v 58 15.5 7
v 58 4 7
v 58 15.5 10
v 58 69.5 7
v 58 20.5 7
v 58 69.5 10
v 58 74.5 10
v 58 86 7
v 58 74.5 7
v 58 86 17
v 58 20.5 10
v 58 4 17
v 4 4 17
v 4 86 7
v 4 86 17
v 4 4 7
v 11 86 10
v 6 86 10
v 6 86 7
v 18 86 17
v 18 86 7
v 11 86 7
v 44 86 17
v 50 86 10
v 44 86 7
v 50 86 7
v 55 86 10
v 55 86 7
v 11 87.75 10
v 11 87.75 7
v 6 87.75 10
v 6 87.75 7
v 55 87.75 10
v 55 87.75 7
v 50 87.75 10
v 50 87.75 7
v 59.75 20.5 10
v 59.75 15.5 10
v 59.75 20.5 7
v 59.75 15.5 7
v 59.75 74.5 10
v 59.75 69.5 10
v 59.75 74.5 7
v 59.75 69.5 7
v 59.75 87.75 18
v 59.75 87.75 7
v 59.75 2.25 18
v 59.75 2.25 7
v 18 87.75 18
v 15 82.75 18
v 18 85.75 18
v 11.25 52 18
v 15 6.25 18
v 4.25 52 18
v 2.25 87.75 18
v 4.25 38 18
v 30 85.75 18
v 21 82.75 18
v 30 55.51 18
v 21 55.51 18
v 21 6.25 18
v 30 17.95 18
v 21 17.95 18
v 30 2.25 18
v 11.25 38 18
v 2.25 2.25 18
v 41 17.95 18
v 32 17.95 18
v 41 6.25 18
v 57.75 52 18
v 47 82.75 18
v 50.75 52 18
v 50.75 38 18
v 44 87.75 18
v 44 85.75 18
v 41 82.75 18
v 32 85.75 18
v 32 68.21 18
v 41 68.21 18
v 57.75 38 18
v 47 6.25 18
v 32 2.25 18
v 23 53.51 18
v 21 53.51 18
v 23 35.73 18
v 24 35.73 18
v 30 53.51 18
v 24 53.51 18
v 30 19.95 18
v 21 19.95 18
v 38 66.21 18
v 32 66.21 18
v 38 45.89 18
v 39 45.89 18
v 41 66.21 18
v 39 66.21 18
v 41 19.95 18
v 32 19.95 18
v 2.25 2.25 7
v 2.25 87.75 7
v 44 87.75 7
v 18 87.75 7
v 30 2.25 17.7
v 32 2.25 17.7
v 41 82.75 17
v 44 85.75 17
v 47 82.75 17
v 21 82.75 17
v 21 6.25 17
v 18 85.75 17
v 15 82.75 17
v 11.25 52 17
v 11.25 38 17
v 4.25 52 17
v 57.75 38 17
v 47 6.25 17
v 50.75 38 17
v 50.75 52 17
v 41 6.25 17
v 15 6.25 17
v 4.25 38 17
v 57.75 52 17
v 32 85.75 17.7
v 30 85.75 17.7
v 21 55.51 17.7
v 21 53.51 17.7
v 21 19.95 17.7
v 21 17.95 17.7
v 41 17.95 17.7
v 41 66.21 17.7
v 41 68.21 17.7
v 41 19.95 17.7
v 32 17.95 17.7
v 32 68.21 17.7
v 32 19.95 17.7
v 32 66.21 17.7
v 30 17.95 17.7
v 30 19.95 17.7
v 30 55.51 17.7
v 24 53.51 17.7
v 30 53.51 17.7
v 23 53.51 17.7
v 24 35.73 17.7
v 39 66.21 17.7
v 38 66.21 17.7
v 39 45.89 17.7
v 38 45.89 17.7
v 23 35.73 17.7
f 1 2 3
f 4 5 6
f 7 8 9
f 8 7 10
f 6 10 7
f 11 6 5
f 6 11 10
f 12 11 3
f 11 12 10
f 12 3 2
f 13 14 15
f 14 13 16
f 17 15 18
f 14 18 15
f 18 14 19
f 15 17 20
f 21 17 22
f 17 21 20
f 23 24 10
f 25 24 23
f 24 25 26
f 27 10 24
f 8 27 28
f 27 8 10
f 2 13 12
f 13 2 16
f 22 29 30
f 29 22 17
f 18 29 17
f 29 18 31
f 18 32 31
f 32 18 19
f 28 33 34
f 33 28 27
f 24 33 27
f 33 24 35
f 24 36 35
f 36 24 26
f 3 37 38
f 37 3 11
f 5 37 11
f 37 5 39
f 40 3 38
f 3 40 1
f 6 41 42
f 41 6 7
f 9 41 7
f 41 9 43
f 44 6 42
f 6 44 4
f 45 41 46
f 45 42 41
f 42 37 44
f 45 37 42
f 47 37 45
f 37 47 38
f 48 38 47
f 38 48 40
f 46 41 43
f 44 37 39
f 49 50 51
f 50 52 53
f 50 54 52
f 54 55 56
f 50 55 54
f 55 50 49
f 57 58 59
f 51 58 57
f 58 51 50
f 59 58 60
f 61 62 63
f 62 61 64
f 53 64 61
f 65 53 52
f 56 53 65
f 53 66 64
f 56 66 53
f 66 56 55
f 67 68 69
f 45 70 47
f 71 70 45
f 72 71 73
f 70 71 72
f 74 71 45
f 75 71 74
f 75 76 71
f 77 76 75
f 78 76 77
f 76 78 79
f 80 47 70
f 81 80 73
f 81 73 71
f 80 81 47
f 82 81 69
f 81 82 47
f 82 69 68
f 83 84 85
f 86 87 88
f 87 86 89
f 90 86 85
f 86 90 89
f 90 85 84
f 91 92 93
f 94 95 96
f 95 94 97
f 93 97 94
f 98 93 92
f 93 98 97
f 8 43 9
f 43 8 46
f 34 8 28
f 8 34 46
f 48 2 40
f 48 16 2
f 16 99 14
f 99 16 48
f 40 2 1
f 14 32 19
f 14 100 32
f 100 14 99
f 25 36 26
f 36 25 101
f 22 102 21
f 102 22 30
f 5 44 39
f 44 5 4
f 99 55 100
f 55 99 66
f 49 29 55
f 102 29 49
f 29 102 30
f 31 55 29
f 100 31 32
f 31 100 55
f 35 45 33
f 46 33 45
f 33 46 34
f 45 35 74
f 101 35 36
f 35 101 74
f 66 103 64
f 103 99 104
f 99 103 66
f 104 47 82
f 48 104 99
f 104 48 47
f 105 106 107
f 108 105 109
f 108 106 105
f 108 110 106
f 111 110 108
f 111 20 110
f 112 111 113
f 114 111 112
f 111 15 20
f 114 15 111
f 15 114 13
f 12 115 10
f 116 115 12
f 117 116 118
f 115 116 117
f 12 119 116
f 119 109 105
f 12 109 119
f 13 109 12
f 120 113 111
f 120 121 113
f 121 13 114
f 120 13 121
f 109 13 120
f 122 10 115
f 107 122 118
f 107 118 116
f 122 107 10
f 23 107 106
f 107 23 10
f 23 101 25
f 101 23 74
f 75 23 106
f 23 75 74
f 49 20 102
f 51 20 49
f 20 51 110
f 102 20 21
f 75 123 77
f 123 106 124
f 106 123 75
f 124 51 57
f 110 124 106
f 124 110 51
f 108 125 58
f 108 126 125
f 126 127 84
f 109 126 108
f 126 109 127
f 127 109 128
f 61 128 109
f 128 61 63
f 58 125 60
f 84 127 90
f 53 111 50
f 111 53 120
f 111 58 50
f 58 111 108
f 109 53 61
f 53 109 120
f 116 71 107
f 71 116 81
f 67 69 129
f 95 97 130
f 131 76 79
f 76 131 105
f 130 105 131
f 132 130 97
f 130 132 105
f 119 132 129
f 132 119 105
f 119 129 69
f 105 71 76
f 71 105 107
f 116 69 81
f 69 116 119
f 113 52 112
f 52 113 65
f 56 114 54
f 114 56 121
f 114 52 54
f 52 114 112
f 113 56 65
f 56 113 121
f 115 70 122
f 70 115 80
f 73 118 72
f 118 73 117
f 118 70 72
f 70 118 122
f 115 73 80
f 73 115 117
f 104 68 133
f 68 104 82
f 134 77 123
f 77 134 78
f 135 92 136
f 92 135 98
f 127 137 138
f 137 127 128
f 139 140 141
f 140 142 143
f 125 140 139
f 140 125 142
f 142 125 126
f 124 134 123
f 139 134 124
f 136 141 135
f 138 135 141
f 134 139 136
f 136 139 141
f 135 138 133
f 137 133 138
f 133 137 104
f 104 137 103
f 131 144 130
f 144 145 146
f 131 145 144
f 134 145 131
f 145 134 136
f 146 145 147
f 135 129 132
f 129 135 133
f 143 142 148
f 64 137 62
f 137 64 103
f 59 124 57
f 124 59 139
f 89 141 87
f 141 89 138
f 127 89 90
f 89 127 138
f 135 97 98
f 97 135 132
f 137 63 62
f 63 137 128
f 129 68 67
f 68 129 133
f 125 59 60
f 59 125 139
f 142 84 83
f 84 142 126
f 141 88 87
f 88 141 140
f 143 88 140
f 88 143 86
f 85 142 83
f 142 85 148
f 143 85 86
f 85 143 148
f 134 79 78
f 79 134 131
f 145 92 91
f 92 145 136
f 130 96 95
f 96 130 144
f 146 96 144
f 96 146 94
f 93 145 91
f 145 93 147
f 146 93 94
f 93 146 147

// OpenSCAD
width = 54;
height = 82;
depth = 10;

holderDepth = 6;

leftSideWidth = 9;
rightSideWidth = 9;

bottomOffset = 1;
bottomCaseDepth = depth + bottomOffset + 2;
bottomCaseWidth = width + 8;
bottomCaseHeight = height + 8;

topCaseWidth = width + 4 - 0.5;
topCaseHeight = height + 4 - 0.5;

STM32Width = 25 + 1;
STM32Height = 60;

module breadboard() {
    translate([0,0,0]) /* body */
        cube([width,height,depth]);
    translate([leftSideWidth/2 - 5/2,height,0]) /* left-top */
        cube([5,2,holderDepth]);
    translate([width/2 - 5/2,height,0]) /* center-top */
        cube([5,2,holderDepth]);
    translate([width - rightSideWidth/2 - 5/2 - 1,height,0]) /* right-top */
        cube([5,2,holderDepth]);
    translate([width,11.5,0]) /* right-up */
        cube([2,5,holderDepth]);
    translate([width,height - 11.5 - 5,0]) /* right-down */
        cube([2,5,holderDepth]);
}

module botttomCase() {
    echo("bottom case", bottomCaseWidth, bottomCaseHeight);

    difference() {
        translate([0,0,0])
            cube([bottomCaseWidth, bottomCaseHeight, bottomCaseDepth]);
        translate([4,4,bottomOffset])
            breadboard();
        translate([2,2,holderDepth])
            cube([width + 4, height + 4, bottomCaseDepth - holderDepth]);

// debug
        translate([bottomCaseWidth/2 - 5, 0, 0])
            cube([10,6,bottomCaseDepth]);
    }
}

module topCase() {
    caseOffset = 1;

    borderDepth = 10;
    topDepth = borderDepth + caseOffset;

    lineLeftX = topCaseWidth/2 - 10;
    lineRightX = topCaseWidth/2 + 10;
    lineWidth = 6;

    echo("top case", topCaseWidth, topCaseHeight);

    difference() {
        translate([0,0,0])
            cube([topCaseWidth, topCaseHeight, topDepth]);
        
        translate([topCaseWidth/2 - width/2, topCaseHeight/2 - height/2, 0])
            cube([width, height, borderDepth]);

        // usb port
        translate([topCaseWidth/2 - STM32Width/2, topCaseHeight - 2, 0])
            cube([STM32Width, 2, topDepth]);

        // pin header line
        translate([lineLeftX - lineWidth, 4, topDepth - caseOffset])
            cube([lineWidth, topCaseHeight - 9, caseOffset]);
        translate([lineRightX, 4, topDepth - caseOffset])
            cube([lineWidth, topCaseHeight - 9, caseOffset]);

        // handle area
        translate([2, topCaseHeight/2 - 7, topDepth - caseOffset])
            cube([7, 14, caseOffset]);
        translate([topCaseWidth-7-2, topCaseHeight/2 - 7, topDepth - caseOffset])
            cube([7, 14, caseOffset]);


        // center
        translate([topCaseWidth/2 - 1, 0, topDepth - 0.3])
            cube([2, topCaseHeight, 0.3]);

        // guide_line
        center_x = topCaseWidth/2 - STM32Width/2;
        translate([center_x, 4 + 2.54*5 - 1, topDepth - 0.3]) /* ROW-0 */
            cube([STM32Width, 2, 0.3]);
        translate([center_x, 4 + 2.54*19 - 1, topDepth - 0.3]) /* Left COL-0 */
            cube([STM32Width/2, 2, 0.3]);
        translate([center_x + 5, 4 + 2.54*(19-7) - 1, topDepth - 0.3])
            cube([1, 2.54*7 + 1, 0.3]);

        translate([center_x + STM32Width/2, 4 + 2.54*24 - 1, topDepth - 0.3]) /* Right COL-0 */
            cube([STM32Width/2, 2, 0.3]);
        translate([center_x + STM32Width - 6, 4 + 2.54*(24-8) - 1, topDepth - 0.3])
            cube([1, 2.54*8, 0.3]);


        translate([topCaseWidth/2 - width/2, topCaseHeight/2 - height/2, -3])
            breadboard();
    }

/*
        translate([topCaseWidth/2 - 10, 0, topDepth])
            cube([20, topCaseHeight, 2]);
        translate([topCaseWidth/2 - 10.5 - 4, 0, topDepth]) color("red")
            cube([4, topCaseHeight, 2]);
*/
}

//translate([0, 0, 0]) color([0.2,0.2,0.2,0.5])
//    botttomCase();

diffX = bottomCaseWidth/2 - topCaseWidth/2;
diffY = bottomCaseHeight/2 - topCaseHeight/2;
translate([diffX, diffY, 7]) //color([1.0,0.2,0.2,0.5])
    topCase();
